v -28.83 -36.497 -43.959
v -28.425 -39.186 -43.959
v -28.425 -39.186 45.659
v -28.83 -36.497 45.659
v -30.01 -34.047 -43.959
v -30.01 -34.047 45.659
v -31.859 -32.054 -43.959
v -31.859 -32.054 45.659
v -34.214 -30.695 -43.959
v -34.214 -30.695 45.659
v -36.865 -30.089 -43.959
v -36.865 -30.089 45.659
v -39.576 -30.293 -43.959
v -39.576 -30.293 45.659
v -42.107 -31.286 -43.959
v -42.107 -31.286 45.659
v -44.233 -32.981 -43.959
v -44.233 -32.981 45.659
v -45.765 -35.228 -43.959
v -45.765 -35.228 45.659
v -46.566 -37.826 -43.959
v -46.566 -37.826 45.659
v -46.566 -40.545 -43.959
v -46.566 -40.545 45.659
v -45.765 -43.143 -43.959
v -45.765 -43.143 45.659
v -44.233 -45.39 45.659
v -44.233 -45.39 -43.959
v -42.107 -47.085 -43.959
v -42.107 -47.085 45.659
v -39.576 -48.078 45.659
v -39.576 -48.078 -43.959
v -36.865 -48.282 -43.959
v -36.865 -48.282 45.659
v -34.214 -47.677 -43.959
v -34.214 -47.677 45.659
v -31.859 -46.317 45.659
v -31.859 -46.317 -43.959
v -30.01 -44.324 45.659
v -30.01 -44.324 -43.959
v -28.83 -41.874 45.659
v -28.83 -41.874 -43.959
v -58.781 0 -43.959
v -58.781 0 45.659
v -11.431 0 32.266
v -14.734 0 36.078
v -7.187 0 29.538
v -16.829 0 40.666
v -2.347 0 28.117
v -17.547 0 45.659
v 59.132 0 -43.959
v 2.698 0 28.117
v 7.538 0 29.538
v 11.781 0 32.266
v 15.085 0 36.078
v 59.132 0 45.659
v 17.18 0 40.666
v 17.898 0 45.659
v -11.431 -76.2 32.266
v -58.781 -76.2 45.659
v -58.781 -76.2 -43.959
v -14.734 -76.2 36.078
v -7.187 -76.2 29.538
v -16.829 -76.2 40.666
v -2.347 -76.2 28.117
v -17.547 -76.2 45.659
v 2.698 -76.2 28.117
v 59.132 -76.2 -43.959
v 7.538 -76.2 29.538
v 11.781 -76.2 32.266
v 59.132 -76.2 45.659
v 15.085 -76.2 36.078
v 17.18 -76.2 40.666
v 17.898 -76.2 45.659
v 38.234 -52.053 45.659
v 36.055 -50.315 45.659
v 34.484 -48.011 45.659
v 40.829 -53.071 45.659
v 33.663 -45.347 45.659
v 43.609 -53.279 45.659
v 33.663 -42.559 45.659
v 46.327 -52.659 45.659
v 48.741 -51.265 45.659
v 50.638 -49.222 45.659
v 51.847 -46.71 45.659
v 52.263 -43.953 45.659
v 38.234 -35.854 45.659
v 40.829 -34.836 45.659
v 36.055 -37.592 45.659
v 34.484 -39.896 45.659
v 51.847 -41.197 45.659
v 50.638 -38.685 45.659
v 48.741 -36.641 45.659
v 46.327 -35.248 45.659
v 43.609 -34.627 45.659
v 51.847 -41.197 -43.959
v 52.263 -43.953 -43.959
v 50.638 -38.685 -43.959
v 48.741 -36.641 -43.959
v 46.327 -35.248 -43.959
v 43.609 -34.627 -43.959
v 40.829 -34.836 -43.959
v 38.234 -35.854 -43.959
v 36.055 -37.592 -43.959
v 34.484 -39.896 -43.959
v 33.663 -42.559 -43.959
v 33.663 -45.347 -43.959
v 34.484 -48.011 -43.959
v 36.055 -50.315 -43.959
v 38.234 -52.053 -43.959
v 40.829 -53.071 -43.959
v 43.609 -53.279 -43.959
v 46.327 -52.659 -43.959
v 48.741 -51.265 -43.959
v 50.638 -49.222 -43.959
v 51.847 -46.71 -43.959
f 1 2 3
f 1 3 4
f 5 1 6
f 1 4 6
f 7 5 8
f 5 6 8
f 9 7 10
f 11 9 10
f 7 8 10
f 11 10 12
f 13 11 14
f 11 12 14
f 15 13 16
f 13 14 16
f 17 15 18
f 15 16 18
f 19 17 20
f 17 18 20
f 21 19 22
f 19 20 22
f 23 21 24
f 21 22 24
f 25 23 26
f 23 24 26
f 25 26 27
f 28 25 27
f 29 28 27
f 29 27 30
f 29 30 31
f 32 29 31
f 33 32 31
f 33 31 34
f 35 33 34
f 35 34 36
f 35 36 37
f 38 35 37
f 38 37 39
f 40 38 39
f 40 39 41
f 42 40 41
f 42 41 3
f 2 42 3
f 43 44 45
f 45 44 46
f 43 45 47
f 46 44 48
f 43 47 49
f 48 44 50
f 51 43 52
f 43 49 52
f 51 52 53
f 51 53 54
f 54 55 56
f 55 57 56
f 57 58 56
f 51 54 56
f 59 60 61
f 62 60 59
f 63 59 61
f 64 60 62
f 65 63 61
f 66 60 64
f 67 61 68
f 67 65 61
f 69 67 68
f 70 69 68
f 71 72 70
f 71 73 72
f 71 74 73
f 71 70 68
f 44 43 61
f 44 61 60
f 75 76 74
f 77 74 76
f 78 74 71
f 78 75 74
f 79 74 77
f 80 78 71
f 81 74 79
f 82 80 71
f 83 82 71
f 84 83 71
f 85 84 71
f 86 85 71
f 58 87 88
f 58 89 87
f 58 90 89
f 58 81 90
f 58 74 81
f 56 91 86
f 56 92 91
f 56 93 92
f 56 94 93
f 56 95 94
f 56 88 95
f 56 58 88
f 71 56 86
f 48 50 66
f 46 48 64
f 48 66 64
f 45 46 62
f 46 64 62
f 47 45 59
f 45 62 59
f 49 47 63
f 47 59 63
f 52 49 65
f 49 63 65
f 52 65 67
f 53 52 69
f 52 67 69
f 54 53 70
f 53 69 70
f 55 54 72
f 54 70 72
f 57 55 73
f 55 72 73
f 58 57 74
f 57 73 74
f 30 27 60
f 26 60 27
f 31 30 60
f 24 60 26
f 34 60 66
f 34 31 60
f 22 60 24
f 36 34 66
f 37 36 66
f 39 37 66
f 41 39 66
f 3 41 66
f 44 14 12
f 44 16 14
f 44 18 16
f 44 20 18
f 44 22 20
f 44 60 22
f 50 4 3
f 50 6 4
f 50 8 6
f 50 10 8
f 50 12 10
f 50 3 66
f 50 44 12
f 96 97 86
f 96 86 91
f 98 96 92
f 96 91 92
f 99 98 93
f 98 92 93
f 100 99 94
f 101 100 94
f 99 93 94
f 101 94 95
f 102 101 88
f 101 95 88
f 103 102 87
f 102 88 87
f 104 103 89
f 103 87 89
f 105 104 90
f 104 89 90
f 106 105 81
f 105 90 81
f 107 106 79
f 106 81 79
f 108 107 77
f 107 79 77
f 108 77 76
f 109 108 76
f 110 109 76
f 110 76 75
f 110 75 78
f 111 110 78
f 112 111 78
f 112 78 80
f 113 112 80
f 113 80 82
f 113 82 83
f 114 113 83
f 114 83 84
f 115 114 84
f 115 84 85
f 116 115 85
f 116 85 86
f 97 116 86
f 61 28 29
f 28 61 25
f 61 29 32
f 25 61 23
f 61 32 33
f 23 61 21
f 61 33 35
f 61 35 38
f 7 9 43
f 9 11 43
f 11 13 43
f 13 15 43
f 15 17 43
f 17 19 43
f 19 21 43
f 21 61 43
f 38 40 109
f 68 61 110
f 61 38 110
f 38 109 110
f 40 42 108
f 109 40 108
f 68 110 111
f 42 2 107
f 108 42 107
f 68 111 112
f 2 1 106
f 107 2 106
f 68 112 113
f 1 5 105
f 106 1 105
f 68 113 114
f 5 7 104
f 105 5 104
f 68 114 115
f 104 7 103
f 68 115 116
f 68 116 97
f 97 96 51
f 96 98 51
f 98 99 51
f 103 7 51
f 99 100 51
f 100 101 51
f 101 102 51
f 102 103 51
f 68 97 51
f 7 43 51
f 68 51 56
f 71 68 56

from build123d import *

# Parameters (mm, degrees)
F0_W     = 117.912918
F0_H     = 89.618679
F1_DEPTH = 76.2
F2_R     = 9.121571
F4_DEPTH = 89.619679
F3_R     = 9.352292
F5_DEPTH = 89.619679
F7_DEPTH = 76.201


with BuildPart() as f1:
    # F0 (on Front) → F1 (new body)
    with BuildSketch(Plane.XZ):
        with Locations((0.175312, 0.850113)):
            Rectangle(F0_W, F0_H)
    extrude(amount=F1_DEPTH)

    # F2 (on face) → F4 (cut, through all)
    with BuildSketch(Plane.XY.offset(45.659453)):
        with Locations((-37.546594, -39.185531)):
            Circle(F2_R)
    extrude(amount=-F4_DEPTH, mode=Mode.SUBTRACT)

    # F3 (on face) → F5 (cut, through all)
    with BuildSketch(Plane.XY.offset(45.659453)):
        with Locations((42.910393, -43.953352)):
            Circle(F3_R)
    extrude(amount=-F5_DEPTH, mode=Mode.SUBTRACT)

    # F6 (on face) → F7 (cut, through all)
    with BuildSketch(Plane.XZ.offset(76.2)):
        with BuildLine():
            ThreePointArc((-17.547329, 45.659453), (0.175312, 27.936811), (17.897953, 45.659453))
            Line((17.897953, 45.659453), (-17.547329, 45.659453))
        make_face()
    extrude(amount=-F7_DEPTH, mode=Mode.SUBTRACT)


solid = f1.part
